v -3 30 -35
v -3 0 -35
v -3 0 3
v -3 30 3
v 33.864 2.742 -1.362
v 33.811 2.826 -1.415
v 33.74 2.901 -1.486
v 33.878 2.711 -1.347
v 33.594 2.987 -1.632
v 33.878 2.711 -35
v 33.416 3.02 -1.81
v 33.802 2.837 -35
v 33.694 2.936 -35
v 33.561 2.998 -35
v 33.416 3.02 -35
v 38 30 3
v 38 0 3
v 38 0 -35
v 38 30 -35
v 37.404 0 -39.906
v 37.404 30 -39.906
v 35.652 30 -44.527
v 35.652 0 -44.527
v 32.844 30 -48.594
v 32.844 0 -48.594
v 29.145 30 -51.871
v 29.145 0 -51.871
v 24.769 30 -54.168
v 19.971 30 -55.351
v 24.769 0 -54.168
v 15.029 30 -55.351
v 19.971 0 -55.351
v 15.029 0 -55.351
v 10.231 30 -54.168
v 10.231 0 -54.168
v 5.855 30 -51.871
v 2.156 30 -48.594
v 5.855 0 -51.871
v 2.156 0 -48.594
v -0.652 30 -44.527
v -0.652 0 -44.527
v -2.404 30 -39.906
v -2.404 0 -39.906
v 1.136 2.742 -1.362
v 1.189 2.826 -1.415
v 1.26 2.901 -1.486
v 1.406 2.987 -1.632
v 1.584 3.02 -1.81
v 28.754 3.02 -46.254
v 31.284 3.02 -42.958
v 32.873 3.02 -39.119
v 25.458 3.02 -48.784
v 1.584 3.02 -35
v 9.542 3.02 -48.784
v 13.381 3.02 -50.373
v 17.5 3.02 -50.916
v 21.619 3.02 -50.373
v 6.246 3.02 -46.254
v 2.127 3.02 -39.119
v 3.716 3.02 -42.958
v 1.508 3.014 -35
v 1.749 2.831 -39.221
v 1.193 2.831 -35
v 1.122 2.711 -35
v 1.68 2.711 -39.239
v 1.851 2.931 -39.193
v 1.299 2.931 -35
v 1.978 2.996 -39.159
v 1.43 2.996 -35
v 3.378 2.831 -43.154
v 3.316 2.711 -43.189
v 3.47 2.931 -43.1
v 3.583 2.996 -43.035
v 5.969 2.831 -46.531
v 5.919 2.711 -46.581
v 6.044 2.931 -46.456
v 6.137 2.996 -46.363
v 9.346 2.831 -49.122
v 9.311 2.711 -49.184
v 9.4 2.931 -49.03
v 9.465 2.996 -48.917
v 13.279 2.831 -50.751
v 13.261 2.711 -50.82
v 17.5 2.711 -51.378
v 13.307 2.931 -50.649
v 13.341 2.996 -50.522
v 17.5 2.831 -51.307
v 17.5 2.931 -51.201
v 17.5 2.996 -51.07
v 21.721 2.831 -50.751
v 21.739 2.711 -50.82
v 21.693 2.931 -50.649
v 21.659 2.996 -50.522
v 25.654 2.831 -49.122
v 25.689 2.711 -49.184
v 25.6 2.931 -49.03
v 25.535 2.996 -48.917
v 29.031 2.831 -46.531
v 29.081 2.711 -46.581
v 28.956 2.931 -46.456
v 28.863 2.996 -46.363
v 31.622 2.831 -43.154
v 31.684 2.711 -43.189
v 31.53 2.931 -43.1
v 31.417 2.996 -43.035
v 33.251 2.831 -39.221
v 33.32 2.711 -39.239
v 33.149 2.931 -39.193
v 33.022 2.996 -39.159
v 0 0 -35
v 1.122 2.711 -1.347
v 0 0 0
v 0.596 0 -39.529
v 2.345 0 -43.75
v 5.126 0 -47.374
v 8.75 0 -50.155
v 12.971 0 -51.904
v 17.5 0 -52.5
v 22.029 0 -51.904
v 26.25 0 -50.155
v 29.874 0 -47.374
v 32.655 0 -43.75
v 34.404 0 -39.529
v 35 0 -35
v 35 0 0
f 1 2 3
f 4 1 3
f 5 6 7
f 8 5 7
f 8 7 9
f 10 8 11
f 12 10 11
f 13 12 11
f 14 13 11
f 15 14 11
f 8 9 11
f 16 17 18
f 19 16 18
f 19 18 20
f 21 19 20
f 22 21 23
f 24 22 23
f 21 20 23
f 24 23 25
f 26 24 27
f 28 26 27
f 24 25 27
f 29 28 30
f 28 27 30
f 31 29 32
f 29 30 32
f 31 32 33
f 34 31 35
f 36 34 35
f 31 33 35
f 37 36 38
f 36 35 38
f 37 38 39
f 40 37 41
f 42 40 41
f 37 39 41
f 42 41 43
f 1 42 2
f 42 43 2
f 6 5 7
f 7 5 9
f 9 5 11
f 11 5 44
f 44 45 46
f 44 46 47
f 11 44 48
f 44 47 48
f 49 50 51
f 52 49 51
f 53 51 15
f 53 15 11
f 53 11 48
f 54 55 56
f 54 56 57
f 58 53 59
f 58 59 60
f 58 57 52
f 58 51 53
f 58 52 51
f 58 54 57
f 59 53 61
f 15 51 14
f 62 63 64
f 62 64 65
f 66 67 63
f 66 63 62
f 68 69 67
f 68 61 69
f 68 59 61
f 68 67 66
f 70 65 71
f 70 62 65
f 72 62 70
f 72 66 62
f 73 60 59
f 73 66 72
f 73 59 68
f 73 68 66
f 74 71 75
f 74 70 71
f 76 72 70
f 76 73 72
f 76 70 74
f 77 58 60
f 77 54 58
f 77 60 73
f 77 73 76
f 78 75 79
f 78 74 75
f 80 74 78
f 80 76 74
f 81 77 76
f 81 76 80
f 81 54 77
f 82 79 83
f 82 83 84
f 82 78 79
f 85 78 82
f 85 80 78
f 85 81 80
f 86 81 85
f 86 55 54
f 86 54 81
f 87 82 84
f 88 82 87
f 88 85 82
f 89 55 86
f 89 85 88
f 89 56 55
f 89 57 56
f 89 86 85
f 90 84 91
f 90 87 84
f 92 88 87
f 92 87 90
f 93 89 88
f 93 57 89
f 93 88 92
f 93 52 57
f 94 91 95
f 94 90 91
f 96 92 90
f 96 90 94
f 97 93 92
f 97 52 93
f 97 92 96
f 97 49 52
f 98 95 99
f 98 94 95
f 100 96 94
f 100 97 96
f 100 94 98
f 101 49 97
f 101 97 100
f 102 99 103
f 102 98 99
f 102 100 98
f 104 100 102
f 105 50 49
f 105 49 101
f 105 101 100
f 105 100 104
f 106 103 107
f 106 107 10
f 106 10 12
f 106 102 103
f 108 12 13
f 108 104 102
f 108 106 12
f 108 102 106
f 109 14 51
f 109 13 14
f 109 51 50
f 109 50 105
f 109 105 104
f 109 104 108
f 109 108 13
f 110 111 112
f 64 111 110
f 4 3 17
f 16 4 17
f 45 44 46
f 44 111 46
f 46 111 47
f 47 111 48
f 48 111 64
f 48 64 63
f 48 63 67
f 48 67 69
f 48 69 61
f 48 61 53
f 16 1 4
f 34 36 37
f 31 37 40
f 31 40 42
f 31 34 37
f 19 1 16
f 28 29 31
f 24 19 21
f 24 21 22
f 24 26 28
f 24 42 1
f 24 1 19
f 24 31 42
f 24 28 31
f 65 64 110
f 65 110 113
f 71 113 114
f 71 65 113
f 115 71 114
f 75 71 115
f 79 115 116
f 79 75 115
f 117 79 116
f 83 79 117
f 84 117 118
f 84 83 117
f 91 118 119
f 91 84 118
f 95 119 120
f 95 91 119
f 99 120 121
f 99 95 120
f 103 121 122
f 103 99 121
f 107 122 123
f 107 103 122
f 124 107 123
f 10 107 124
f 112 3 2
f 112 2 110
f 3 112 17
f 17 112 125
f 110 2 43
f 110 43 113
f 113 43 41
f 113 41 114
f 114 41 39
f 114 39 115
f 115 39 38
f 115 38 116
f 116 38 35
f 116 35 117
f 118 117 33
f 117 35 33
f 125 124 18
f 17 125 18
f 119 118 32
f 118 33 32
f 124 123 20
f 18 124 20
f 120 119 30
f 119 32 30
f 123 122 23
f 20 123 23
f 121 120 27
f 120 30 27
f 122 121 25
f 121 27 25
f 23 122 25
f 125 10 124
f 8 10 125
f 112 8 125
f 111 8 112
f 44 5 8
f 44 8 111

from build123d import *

# Parameters (mm, degrees)
BOSS_EXTRUDE1_DEPTH = 30
FILLET1_R           = 0.5


with BuildPart() as part:
    # Sketch2 → Boss-Extrude1 (new body)
    with BuildSketch(Plane(origin=(0, 0, 0), x_dir=(1, 0, 0), z_dir=(0, 1, 0))):
        with BuildLine():
            ThreePointArc((38, 35), (17.5, 55.5), (-3, 35))
            Line((-3, 35), (-3, -3))
            Line((-3, -3), (38, -3))
            Line((38, -3), (38, 35))
        make_face()
    extrude(amount=BOSS_EXTRUDE1_DEPTH)

    # Sketch2<9> → Cut-Loft1 section 0
    with BuildSketch(Plane(origin=(0, 0, 0), x_dir=(1, 0, 0), z_dir=(0, 1, 0))):
        with BuildLine():
            Line((0, 0), (0, 35))
            ThreePointArc((0, 35), (17.5, 52.5), (35, 35))
            Line((35, 35), (35, 0))
            Line((35, 0), (0, 0))
        make_face()
    # Sketch3 → Cut-Loft1 section 1
    with BuildSketch(Plane(origin=(0, 3.02, 0), x_dir=(-1, 0, 0), z_dir=(0, -1, 0))):
        with BuildLine():
            Line((-33.75, 1.5), (-1.25, 1.5))
            Line((-1.25, 1.5), (-1.25, 35))
            ThreePointArc((-1.25, 35), (-17.5, 51.25), (-33.75, 35))
            Line((-33.75, 35), (-33.75, 1.5))
        make_face()
    loft(mode=Mode.SUBTRACT)

    # Fillet1
    fillet1_edges = [part.edges().sort_by_distance(p)[0] for p in [
        (1.25, 3.02, -18.25),
        (33.75, 3.02, -18.25),
        (17.5, 3.02, -1.5),
        (17.5, 3.02, -51.25),
    ]]
    fillet(fillet1_edges, radius=FILLET1_R)


solid = part.part
